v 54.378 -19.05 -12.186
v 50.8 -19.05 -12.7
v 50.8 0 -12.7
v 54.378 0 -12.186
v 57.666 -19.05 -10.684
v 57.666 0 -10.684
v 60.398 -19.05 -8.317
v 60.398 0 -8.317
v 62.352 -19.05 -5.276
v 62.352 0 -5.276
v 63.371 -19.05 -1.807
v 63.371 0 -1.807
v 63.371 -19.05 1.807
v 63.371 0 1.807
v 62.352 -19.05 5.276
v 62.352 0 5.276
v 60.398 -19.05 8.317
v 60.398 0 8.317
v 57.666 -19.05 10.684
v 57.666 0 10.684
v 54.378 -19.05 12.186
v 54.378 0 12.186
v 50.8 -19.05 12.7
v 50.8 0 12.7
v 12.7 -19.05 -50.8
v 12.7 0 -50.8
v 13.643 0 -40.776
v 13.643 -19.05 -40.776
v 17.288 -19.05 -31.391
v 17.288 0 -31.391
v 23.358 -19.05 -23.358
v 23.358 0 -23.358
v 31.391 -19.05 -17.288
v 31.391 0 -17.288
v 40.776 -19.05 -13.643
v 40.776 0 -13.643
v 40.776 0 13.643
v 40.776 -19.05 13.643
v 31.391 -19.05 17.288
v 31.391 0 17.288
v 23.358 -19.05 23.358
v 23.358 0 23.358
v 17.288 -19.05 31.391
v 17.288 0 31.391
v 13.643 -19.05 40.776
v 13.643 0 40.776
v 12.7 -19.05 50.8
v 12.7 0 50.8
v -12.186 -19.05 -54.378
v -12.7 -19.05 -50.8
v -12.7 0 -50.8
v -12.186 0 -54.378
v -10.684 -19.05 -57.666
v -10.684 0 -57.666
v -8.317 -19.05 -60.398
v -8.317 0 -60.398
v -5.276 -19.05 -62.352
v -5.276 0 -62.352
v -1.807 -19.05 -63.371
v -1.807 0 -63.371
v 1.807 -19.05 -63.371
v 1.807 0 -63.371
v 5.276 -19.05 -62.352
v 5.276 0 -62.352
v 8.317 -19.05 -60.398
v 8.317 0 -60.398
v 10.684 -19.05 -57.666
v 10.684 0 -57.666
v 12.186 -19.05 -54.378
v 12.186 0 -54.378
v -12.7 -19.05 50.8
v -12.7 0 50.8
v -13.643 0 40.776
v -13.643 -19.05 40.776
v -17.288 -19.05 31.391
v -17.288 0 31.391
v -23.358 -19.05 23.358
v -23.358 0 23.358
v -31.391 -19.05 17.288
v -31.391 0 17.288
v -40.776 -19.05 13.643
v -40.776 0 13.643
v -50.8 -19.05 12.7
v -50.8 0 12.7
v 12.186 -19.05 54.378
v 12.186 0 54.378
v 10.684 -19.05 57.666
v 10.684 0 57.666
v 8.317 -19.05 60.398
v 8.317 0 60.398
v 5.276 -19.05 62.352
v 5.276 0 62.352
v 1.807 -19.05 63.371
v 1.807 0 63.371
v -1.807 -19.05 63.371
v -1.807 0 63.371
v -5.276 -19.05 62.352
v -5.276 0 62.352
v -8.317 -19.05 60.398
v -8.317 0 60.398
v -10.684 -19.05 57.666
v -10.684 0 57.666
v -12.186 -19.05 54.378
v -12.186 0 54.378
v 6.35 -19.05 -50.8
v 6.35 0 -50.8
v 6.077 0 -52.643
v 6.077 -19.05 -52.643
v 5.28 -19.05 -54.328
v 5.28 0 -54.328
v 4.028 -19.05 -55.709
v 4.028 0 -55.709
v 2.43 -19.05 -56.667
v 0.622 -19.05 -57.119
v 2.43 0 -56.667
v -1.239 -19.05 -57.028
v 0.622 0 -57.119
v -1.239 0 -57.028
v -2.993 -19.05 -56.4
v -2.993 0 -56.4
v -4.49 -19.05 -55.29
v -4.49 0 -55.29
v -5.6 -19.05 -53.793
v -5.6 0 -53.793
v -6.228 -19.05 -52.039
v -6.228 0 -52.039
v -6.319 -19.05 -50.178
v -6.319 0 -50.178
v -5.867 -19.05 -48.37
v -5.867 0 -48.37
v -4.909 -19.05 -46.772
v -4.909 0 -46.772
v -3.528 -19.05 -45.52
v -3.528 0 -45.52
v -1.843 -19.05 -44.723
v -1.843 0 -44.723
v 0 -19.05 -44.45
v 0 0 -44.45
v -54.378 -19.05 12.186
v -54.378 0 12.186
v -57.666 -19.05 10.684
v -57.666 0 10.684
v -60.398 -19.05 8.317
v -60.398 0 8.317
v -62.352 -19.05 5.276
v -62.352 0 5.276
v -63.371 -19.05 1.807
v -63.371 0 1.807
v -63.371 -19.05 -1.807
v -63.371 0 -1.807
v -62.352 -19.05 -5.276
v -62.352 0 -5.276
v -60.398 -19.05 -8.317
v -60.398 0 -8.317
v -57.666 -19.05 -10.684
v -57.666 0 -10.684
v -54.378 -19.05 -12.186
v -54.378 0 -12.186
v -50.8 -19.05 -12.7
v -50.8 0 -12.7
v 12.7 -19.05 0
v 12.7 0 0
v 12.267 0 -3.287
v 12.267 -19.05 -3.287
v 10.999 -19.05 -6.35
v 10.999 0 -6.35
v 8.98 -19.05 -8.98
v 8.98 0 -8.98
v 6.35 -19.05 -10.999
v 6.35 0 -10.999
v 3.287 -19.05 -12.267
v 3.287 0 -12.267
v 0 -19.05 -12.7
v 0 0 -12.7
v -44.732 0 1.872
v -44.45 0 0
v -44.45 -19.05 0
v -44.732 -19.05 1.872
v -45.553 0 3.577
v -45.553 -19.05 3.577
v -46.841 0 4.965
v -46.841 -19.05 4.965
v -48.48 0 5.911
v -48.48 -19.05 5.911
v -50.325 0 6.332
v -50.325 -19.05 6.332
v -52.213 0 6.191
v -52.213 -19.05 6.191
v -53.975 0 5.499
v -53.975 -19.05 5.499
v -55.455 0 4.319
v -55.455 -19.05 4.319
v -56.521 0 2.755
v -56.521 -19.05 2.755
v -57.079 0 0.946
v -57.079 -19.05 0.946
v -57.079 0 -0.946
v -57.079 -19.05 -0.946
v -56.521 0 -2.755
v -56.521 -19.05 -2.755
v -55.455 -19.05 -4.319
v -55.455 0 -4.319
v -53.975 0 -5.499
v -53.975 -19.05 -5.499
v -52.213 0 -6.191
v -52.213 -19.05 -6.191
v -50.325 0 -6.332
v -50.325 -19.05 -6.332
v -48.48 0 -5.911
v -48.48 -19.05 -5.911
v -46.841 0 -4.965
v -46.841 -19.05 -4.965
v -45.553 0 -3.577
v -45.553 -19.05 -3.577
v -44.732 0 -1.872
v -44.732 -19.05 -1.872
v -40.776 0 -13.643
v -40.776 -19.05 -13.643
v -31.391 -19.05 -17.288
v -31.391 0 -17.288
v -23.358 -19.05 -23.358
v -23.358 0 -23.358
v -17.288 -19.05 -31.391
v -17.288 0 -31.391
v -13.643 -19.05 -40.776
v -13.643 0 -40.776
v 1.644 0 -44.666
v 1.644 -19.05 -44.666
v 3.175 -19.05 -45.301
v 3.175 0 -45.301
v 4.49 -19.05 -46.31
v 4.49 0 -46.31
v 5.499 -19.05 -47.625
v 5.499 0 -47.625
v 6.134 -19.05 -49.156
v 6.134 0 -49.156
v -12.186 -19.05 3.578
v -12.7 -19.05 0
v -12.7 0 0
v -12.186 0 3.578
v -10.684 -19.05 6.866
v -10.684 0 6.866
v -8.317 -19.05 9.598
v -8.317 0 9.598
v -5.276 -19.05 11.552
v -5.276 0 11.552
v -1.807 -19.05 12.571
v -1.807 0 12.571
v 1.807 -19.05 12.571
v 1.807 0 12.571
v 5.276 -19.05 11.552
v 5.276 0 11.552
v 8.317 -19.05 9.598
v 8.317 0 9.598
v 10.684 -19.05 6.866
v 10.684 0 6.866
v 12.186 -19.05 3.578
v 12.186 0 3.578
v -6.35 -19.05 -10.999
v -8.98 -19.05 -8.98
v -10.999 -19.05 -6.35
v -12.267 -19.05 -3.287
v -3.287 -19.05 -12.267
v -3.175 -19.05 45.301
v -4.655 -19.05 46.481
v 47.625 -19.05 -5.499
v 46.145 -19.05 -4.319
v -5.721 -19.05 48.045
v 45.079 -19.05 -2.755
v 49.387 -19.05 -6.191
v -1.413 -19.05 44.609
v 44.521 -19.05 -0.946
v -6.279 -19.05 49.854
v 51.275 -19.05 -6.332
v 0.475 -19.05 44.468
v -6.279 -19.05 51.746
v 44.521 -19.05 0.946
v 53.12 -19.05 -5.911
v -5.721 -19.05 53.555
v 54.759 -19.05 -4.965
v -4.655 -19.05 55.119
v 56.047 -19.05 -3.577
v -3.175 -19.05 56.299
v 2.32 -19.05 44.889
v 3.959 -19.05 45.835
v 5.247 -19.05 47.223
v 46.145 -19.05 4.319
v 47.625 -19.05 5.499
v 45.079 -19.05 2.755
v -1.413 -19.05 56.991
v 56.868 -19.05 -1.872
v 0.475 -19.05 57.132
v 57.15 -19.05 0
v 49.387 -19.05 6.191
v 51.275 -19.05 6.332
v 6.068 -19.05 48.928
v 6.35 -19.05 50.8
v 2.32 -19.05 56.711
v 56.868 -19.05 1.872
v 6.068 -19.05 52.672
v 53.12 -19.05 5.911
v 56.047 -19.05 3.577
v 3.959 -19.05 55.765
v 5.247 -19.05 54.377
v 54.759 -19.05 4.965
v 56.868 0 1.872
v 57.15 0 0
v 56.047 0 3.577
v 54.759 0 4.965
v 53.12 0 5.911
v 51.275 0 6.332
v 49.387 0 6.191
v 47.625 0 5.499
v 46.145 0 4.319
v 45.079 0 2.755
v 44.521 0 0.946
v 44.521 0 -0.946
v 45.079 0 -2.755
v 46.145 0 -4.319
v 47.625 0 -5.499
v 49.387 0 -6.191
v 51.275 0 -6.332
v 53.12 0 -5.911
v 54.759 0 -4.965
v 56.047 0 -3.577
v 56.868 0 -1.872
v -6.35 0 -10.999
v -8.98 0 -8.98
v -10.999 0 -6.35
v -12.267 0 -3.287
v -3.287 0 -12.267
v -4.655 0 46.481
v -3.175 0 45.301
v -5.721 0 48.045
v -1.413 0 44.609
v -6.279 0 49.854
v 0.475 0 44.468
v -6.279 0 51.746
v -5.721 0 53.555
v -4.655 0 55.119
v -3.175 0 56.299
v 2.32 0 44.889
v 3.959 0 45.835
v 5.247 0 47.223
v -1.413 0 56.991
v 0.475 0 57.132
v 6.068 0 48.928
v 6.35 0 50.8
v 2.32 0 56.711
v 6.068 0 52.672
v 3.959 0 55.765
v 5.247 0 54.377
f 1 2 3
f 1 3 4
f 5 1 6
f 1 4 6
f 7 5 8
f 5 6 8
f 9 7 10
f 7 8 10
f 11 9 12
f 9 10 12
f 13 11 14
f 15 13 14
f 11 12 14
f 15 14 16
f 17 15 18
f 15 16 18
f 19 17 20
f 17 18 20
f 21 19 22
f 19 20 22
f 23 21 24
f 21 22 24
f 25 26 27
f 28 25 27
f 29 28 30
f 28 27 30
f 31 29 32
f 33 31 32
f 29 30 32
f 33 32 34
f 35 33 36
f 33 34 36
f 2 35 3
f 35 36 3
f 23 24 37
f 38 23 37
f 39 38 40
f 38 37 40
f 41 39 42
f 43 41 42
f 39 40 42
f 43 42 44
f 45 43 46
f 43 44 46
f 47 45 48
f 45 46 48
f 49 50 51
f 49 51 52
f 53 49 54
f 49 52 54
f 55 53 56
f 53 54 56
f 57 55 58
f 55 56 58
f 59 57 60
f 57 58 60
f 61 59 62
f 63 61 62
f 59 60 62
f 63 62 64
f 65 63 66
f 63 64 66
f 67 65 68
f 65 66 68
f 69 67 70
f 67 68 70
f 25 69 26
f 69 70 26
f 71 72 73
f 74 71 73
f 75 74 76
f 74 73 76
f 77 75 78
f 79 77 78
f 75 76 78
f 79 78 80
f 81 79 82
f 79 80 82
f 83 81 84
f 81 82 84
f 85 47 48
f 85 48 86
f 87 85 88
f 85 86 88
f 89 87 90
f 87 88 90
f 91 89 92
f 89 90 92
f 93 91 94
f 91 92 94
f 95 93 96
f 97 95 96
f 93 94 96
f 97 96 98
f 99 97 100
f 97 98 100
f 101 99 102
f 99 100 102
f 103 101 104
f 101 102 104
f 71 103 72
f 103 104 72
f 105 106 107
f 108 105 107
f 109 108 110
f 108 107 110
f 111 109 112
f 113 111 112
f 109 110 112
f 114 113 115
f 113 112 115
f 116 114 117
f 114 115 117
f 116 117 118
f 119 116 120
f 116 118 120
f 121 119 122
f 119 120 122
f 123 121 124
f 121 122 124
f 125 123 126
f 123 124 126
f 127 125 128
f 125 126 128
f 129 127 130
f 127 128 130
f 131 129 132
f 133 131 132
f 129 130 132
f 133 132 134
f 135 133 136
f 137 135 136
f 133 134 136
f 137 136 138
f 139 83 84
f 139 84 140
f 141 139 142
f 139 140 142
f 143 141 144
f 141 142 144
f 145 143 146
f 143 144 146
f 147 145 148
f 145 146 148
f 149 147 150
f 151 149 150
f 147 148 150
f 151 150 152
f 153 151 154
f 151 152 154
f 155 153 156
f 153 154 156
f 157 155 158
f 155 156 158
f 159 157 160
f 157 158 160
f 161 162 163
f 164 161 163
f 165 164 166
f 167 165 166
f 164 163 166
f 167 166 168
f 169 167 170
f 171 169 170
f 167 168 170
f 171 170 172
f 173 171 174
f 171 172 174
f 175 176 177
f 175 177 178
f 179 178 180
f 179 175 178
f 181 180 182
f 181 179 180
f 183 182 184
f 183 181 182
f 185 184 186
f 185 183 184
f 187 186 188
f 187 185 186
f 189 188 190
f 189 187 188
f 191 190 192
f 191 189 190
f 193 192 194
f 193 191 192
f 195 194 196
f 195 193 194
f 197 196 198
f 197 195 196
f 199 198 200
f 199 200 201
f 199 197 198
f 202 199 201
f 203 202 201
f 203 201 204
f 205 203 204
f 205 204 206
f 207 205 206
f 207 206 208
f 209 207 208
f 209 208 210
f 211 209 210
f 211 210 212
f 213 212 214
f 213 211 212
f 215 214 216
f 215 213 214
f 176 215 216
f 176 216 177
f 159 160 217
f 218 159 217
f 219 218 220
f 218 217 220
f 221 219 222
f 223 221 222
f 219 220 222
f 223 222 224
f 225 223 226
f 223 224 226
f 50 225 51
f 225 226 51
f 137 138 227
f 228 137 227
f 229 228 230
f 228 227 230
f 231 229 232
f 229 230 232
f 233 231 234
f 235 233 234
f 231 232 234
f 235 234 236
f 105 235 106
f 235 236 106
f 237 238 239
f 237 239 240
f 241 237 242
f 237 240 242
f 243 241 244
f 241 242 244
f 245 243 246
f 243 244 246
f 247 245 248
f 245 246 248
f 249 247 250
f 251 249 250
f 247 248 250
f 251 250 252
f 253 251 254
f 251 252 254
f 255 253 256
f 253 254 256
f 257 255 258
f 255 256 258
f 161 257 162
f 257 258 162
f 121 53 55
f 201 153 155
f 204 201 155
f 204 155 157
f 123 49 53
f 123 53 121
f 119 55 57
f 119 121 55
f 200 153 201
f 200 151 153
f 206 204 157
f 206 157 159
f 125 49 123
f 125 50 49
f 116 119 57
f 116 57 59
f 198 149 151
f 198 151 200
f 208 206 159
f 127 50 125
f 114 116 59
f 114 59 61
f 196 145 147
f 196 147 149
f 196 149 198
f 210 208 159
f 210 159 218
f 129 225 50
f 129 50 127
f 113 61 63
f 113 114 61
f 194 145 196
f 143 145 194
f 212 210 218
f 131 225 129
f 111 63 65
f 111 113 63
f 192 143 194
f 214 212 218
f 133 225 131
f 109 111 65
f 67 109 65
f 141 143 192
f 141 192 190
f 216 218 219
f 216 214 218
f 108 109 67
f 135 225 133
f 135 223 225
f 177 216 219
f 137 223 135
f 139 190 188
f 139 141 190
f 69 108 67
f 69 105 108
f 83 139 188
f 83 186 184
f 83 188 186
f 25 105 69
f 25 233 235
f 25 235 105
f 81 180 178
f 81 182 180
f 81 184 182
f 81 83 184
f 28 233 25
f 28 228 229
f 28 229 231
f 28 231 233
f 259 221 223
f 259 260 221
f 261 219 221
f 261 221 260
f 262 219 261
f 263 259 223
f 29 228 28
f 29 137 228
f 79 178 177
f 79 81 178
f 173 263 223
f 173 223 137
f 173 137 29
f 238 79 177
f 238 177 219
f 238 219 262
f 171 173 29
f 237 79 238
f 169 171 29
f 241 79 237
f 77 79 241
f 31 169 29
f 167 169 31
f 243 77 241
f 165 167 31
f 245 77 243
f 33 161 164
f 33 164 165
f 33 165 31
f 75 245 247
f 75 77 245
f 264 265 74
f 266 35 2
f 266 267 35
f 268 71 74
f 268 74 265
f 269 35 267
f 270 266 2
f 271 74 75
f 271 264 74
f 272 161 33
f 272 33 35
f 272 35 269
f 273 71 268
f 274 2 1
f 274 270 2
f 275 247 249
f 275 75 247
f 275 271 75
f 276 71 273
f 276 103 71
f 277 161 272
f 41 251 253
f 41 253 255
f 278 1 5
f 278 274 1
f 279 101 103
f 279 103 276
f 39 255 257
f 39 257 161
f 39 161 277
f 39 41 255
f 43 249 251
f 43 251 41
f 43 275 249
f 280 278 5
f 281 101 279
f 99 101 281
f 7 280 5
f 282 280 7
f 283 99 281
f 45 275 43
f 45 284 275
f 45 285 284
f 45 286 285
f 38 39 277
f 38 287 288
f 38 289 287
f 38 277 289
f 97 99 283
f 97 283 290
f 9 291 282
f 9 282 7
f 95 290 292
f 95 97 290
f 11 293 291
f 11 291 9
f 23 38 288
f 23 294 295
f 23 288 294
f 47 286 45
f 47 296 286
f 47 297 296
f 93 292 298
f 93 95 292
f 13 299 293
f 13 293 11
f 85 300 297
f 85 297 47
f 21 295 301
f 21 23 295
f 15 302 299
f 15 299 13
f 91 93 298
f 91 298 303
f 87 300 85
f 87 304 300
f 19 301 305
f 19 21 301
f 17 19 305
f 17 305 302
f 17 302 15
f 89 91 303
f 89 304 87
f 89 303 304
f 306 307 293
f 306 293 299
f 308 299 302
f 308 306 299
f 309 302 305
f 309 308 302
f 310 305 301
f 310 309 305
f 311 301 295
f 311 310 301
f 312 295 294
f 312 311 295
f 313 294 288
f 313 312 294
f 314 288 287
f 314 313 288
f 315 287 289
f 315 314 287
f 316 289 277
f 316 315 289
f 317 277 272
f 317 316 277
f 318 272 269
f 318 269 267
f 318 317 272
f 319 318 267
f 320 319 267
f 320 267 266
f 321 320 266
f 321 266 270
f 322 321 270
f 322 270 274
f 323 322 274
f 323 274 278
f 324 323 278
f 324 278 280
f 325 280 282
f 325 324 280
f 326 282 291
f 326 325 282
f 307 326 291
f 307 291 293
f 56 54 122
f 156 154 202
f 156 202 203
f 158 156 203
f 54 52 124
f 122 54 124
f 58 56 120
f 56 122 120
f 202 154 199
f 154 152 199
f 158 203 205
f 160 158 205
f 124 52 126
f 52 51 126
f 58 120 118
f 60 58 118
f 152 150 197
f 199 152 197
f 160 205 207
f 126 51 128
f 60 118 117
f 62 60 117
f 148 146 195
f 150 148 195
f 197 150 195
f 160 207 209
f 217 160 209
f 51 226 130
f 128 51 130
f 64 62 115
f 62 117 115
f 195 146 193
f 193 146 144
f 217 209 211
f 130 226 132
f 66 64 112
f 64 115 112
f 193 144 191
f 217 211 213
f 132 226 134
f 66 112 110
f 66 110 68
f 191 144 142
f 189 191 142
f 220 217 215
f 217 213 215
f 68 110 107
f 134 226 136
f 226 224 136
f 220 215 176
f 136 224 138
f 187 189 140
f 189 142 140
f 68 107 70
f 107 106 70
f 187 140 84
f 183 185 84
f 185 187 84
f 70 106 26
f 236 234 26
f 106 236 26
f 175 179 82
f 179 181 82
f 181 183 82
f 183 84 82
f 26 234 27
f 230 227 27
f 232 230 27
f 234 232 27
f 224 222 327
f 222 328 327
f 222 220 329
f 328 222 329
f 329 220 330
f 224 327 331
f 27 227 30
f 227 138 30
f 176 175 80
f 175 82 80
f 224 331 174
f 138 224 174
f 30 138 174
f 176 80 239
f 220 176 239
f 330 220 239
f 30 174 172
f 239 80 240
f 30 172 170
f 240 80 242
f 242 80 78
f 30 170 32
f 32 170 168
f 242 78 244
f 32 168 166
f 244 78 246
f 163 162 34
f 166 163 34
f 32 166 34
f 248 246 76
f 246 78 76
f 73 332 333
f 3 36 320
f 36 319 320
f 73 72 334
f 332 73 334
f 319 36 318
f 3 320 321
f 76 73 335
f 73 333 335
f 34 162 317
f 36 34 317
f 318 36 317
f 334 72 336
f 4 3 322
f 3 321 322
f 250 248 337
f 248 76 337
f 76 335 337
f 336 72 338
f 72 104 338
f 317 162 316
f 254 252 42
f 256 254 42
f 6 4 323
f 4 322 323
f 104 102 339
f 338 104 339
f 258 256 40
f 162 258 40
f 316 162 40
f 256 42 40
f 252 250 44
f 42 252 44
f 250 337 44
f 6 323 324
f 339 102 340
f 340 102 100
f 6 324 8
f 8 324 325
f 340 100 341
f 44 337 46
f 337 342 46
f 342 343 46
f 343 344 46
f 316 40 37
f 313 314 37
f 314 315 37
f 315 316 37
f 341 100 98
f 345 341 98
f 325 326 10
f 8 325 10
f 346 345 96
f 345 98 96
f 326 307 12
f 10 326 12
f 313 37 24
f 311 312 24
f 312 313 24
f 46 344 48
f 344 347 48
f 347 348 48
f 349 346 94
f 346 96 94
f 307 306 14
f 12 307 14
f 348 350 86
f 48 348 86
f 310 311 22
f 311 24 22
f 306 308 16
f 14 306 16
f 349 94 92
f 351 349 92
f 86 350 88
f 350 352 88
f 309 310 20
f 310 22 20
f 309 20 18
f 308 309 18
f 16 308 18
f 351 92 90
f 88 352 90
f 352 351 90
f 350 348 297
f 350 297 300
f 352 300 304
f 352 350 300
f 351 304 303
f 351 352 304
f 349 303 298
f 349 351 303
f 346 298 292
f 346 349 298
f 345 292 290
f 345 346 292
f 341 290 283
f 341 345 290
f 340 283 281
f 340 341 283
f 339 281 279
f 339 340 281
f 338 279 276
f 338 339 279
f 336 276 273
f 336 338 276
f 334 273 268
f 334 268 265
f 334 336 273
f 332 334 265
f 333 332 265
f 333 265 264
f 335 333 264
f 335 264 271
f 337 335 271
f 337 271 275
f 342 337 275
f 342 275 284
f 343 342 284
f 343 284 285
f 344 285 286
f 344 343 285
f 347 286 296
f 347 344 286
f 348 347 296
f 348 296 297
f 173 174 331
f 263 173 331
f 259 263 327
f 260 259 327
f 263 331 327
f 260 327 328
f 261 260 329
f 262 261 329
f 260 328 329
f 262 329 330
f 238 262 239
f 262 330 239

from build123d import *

# Parameters (mm, degrees)
F0_R     = 6.35
F1_DEPTH = 19.05


with BuildPart() as f1:
    # F0 (on Front) → F1 (new body)
    with BuildSketch(Plane.XZ):
        with BuildLine():
            ThreePointArc((6.35, -50.8), (4.490128, -46.309872), (0, -44.45))
            ThreePointArc((0, -44.45), (-4.490128, -55.290128), (6.35, -50.8))
        make_face()
        with BuildLine():
            ThreePointArc((-12.7, 50.8), (-23.358147, 23.358147), (-50.8, 12.7))
            ThreePointArc((-50.8, 12.7), (-63.5, 0), (-50.8, -12.7))
            ThreePointArc((-50.8, -12.7), (-23.358147, -23.358147), (-12.7, -50.8))
            ThreePointArc((-12.7, -50.8), (0, -63.5), (12.7, -50.8))
            ThreePointArc((12.7, -50.8), (23.358147, -23.358147), (50.8, -12.7))
            ThreePointArc((50.8, -12.7), (63.5, 0), (50.8, 12.7))
            ThreePointArc((50.8, 12.7), (23.358147, 23.358147), (12.7, 50.8))
            ThreePointArc((12.7, 50.8), (0, 63.5), (-12.7, 50.8))
        make_face()
        with BuildLine():
            ThreePointArc((6.35, -50.8), (-4.490128, -55.290128), (0, -44.45))
            ThreePointArc((0, -44.45), (4.490128, -46.309872), (6.35, -50.8))
        make_face(mode=Mode.SUBTRACT)
        with Locations((-50.8, 0)):
            Circle(F0_R, mode=Mode.SUBTRACT)
        with BuildLine():
            ThreePointArc((12.7, 0), (8.980256, -8.980256), (0, -12.7))
            ThreePointArc((0, -12.7), (-8.980256, -8.980256), (-12.7, 0))
            ThreePointArc((-12.7, 0), (0, 12.7), (12.7, 0))
        make_face(mode=Mode.SUBTRACT)
        with Locations((50.8, 0)):
            Circle(F0_R, mode=Mode.SUBTRACT)
        with Locations((0, 50.8)):
            Circle(F0_R, mode=Mode.SUBTRACT)
    extrude(amount=F1_DEPTH)


solid = f1.part
